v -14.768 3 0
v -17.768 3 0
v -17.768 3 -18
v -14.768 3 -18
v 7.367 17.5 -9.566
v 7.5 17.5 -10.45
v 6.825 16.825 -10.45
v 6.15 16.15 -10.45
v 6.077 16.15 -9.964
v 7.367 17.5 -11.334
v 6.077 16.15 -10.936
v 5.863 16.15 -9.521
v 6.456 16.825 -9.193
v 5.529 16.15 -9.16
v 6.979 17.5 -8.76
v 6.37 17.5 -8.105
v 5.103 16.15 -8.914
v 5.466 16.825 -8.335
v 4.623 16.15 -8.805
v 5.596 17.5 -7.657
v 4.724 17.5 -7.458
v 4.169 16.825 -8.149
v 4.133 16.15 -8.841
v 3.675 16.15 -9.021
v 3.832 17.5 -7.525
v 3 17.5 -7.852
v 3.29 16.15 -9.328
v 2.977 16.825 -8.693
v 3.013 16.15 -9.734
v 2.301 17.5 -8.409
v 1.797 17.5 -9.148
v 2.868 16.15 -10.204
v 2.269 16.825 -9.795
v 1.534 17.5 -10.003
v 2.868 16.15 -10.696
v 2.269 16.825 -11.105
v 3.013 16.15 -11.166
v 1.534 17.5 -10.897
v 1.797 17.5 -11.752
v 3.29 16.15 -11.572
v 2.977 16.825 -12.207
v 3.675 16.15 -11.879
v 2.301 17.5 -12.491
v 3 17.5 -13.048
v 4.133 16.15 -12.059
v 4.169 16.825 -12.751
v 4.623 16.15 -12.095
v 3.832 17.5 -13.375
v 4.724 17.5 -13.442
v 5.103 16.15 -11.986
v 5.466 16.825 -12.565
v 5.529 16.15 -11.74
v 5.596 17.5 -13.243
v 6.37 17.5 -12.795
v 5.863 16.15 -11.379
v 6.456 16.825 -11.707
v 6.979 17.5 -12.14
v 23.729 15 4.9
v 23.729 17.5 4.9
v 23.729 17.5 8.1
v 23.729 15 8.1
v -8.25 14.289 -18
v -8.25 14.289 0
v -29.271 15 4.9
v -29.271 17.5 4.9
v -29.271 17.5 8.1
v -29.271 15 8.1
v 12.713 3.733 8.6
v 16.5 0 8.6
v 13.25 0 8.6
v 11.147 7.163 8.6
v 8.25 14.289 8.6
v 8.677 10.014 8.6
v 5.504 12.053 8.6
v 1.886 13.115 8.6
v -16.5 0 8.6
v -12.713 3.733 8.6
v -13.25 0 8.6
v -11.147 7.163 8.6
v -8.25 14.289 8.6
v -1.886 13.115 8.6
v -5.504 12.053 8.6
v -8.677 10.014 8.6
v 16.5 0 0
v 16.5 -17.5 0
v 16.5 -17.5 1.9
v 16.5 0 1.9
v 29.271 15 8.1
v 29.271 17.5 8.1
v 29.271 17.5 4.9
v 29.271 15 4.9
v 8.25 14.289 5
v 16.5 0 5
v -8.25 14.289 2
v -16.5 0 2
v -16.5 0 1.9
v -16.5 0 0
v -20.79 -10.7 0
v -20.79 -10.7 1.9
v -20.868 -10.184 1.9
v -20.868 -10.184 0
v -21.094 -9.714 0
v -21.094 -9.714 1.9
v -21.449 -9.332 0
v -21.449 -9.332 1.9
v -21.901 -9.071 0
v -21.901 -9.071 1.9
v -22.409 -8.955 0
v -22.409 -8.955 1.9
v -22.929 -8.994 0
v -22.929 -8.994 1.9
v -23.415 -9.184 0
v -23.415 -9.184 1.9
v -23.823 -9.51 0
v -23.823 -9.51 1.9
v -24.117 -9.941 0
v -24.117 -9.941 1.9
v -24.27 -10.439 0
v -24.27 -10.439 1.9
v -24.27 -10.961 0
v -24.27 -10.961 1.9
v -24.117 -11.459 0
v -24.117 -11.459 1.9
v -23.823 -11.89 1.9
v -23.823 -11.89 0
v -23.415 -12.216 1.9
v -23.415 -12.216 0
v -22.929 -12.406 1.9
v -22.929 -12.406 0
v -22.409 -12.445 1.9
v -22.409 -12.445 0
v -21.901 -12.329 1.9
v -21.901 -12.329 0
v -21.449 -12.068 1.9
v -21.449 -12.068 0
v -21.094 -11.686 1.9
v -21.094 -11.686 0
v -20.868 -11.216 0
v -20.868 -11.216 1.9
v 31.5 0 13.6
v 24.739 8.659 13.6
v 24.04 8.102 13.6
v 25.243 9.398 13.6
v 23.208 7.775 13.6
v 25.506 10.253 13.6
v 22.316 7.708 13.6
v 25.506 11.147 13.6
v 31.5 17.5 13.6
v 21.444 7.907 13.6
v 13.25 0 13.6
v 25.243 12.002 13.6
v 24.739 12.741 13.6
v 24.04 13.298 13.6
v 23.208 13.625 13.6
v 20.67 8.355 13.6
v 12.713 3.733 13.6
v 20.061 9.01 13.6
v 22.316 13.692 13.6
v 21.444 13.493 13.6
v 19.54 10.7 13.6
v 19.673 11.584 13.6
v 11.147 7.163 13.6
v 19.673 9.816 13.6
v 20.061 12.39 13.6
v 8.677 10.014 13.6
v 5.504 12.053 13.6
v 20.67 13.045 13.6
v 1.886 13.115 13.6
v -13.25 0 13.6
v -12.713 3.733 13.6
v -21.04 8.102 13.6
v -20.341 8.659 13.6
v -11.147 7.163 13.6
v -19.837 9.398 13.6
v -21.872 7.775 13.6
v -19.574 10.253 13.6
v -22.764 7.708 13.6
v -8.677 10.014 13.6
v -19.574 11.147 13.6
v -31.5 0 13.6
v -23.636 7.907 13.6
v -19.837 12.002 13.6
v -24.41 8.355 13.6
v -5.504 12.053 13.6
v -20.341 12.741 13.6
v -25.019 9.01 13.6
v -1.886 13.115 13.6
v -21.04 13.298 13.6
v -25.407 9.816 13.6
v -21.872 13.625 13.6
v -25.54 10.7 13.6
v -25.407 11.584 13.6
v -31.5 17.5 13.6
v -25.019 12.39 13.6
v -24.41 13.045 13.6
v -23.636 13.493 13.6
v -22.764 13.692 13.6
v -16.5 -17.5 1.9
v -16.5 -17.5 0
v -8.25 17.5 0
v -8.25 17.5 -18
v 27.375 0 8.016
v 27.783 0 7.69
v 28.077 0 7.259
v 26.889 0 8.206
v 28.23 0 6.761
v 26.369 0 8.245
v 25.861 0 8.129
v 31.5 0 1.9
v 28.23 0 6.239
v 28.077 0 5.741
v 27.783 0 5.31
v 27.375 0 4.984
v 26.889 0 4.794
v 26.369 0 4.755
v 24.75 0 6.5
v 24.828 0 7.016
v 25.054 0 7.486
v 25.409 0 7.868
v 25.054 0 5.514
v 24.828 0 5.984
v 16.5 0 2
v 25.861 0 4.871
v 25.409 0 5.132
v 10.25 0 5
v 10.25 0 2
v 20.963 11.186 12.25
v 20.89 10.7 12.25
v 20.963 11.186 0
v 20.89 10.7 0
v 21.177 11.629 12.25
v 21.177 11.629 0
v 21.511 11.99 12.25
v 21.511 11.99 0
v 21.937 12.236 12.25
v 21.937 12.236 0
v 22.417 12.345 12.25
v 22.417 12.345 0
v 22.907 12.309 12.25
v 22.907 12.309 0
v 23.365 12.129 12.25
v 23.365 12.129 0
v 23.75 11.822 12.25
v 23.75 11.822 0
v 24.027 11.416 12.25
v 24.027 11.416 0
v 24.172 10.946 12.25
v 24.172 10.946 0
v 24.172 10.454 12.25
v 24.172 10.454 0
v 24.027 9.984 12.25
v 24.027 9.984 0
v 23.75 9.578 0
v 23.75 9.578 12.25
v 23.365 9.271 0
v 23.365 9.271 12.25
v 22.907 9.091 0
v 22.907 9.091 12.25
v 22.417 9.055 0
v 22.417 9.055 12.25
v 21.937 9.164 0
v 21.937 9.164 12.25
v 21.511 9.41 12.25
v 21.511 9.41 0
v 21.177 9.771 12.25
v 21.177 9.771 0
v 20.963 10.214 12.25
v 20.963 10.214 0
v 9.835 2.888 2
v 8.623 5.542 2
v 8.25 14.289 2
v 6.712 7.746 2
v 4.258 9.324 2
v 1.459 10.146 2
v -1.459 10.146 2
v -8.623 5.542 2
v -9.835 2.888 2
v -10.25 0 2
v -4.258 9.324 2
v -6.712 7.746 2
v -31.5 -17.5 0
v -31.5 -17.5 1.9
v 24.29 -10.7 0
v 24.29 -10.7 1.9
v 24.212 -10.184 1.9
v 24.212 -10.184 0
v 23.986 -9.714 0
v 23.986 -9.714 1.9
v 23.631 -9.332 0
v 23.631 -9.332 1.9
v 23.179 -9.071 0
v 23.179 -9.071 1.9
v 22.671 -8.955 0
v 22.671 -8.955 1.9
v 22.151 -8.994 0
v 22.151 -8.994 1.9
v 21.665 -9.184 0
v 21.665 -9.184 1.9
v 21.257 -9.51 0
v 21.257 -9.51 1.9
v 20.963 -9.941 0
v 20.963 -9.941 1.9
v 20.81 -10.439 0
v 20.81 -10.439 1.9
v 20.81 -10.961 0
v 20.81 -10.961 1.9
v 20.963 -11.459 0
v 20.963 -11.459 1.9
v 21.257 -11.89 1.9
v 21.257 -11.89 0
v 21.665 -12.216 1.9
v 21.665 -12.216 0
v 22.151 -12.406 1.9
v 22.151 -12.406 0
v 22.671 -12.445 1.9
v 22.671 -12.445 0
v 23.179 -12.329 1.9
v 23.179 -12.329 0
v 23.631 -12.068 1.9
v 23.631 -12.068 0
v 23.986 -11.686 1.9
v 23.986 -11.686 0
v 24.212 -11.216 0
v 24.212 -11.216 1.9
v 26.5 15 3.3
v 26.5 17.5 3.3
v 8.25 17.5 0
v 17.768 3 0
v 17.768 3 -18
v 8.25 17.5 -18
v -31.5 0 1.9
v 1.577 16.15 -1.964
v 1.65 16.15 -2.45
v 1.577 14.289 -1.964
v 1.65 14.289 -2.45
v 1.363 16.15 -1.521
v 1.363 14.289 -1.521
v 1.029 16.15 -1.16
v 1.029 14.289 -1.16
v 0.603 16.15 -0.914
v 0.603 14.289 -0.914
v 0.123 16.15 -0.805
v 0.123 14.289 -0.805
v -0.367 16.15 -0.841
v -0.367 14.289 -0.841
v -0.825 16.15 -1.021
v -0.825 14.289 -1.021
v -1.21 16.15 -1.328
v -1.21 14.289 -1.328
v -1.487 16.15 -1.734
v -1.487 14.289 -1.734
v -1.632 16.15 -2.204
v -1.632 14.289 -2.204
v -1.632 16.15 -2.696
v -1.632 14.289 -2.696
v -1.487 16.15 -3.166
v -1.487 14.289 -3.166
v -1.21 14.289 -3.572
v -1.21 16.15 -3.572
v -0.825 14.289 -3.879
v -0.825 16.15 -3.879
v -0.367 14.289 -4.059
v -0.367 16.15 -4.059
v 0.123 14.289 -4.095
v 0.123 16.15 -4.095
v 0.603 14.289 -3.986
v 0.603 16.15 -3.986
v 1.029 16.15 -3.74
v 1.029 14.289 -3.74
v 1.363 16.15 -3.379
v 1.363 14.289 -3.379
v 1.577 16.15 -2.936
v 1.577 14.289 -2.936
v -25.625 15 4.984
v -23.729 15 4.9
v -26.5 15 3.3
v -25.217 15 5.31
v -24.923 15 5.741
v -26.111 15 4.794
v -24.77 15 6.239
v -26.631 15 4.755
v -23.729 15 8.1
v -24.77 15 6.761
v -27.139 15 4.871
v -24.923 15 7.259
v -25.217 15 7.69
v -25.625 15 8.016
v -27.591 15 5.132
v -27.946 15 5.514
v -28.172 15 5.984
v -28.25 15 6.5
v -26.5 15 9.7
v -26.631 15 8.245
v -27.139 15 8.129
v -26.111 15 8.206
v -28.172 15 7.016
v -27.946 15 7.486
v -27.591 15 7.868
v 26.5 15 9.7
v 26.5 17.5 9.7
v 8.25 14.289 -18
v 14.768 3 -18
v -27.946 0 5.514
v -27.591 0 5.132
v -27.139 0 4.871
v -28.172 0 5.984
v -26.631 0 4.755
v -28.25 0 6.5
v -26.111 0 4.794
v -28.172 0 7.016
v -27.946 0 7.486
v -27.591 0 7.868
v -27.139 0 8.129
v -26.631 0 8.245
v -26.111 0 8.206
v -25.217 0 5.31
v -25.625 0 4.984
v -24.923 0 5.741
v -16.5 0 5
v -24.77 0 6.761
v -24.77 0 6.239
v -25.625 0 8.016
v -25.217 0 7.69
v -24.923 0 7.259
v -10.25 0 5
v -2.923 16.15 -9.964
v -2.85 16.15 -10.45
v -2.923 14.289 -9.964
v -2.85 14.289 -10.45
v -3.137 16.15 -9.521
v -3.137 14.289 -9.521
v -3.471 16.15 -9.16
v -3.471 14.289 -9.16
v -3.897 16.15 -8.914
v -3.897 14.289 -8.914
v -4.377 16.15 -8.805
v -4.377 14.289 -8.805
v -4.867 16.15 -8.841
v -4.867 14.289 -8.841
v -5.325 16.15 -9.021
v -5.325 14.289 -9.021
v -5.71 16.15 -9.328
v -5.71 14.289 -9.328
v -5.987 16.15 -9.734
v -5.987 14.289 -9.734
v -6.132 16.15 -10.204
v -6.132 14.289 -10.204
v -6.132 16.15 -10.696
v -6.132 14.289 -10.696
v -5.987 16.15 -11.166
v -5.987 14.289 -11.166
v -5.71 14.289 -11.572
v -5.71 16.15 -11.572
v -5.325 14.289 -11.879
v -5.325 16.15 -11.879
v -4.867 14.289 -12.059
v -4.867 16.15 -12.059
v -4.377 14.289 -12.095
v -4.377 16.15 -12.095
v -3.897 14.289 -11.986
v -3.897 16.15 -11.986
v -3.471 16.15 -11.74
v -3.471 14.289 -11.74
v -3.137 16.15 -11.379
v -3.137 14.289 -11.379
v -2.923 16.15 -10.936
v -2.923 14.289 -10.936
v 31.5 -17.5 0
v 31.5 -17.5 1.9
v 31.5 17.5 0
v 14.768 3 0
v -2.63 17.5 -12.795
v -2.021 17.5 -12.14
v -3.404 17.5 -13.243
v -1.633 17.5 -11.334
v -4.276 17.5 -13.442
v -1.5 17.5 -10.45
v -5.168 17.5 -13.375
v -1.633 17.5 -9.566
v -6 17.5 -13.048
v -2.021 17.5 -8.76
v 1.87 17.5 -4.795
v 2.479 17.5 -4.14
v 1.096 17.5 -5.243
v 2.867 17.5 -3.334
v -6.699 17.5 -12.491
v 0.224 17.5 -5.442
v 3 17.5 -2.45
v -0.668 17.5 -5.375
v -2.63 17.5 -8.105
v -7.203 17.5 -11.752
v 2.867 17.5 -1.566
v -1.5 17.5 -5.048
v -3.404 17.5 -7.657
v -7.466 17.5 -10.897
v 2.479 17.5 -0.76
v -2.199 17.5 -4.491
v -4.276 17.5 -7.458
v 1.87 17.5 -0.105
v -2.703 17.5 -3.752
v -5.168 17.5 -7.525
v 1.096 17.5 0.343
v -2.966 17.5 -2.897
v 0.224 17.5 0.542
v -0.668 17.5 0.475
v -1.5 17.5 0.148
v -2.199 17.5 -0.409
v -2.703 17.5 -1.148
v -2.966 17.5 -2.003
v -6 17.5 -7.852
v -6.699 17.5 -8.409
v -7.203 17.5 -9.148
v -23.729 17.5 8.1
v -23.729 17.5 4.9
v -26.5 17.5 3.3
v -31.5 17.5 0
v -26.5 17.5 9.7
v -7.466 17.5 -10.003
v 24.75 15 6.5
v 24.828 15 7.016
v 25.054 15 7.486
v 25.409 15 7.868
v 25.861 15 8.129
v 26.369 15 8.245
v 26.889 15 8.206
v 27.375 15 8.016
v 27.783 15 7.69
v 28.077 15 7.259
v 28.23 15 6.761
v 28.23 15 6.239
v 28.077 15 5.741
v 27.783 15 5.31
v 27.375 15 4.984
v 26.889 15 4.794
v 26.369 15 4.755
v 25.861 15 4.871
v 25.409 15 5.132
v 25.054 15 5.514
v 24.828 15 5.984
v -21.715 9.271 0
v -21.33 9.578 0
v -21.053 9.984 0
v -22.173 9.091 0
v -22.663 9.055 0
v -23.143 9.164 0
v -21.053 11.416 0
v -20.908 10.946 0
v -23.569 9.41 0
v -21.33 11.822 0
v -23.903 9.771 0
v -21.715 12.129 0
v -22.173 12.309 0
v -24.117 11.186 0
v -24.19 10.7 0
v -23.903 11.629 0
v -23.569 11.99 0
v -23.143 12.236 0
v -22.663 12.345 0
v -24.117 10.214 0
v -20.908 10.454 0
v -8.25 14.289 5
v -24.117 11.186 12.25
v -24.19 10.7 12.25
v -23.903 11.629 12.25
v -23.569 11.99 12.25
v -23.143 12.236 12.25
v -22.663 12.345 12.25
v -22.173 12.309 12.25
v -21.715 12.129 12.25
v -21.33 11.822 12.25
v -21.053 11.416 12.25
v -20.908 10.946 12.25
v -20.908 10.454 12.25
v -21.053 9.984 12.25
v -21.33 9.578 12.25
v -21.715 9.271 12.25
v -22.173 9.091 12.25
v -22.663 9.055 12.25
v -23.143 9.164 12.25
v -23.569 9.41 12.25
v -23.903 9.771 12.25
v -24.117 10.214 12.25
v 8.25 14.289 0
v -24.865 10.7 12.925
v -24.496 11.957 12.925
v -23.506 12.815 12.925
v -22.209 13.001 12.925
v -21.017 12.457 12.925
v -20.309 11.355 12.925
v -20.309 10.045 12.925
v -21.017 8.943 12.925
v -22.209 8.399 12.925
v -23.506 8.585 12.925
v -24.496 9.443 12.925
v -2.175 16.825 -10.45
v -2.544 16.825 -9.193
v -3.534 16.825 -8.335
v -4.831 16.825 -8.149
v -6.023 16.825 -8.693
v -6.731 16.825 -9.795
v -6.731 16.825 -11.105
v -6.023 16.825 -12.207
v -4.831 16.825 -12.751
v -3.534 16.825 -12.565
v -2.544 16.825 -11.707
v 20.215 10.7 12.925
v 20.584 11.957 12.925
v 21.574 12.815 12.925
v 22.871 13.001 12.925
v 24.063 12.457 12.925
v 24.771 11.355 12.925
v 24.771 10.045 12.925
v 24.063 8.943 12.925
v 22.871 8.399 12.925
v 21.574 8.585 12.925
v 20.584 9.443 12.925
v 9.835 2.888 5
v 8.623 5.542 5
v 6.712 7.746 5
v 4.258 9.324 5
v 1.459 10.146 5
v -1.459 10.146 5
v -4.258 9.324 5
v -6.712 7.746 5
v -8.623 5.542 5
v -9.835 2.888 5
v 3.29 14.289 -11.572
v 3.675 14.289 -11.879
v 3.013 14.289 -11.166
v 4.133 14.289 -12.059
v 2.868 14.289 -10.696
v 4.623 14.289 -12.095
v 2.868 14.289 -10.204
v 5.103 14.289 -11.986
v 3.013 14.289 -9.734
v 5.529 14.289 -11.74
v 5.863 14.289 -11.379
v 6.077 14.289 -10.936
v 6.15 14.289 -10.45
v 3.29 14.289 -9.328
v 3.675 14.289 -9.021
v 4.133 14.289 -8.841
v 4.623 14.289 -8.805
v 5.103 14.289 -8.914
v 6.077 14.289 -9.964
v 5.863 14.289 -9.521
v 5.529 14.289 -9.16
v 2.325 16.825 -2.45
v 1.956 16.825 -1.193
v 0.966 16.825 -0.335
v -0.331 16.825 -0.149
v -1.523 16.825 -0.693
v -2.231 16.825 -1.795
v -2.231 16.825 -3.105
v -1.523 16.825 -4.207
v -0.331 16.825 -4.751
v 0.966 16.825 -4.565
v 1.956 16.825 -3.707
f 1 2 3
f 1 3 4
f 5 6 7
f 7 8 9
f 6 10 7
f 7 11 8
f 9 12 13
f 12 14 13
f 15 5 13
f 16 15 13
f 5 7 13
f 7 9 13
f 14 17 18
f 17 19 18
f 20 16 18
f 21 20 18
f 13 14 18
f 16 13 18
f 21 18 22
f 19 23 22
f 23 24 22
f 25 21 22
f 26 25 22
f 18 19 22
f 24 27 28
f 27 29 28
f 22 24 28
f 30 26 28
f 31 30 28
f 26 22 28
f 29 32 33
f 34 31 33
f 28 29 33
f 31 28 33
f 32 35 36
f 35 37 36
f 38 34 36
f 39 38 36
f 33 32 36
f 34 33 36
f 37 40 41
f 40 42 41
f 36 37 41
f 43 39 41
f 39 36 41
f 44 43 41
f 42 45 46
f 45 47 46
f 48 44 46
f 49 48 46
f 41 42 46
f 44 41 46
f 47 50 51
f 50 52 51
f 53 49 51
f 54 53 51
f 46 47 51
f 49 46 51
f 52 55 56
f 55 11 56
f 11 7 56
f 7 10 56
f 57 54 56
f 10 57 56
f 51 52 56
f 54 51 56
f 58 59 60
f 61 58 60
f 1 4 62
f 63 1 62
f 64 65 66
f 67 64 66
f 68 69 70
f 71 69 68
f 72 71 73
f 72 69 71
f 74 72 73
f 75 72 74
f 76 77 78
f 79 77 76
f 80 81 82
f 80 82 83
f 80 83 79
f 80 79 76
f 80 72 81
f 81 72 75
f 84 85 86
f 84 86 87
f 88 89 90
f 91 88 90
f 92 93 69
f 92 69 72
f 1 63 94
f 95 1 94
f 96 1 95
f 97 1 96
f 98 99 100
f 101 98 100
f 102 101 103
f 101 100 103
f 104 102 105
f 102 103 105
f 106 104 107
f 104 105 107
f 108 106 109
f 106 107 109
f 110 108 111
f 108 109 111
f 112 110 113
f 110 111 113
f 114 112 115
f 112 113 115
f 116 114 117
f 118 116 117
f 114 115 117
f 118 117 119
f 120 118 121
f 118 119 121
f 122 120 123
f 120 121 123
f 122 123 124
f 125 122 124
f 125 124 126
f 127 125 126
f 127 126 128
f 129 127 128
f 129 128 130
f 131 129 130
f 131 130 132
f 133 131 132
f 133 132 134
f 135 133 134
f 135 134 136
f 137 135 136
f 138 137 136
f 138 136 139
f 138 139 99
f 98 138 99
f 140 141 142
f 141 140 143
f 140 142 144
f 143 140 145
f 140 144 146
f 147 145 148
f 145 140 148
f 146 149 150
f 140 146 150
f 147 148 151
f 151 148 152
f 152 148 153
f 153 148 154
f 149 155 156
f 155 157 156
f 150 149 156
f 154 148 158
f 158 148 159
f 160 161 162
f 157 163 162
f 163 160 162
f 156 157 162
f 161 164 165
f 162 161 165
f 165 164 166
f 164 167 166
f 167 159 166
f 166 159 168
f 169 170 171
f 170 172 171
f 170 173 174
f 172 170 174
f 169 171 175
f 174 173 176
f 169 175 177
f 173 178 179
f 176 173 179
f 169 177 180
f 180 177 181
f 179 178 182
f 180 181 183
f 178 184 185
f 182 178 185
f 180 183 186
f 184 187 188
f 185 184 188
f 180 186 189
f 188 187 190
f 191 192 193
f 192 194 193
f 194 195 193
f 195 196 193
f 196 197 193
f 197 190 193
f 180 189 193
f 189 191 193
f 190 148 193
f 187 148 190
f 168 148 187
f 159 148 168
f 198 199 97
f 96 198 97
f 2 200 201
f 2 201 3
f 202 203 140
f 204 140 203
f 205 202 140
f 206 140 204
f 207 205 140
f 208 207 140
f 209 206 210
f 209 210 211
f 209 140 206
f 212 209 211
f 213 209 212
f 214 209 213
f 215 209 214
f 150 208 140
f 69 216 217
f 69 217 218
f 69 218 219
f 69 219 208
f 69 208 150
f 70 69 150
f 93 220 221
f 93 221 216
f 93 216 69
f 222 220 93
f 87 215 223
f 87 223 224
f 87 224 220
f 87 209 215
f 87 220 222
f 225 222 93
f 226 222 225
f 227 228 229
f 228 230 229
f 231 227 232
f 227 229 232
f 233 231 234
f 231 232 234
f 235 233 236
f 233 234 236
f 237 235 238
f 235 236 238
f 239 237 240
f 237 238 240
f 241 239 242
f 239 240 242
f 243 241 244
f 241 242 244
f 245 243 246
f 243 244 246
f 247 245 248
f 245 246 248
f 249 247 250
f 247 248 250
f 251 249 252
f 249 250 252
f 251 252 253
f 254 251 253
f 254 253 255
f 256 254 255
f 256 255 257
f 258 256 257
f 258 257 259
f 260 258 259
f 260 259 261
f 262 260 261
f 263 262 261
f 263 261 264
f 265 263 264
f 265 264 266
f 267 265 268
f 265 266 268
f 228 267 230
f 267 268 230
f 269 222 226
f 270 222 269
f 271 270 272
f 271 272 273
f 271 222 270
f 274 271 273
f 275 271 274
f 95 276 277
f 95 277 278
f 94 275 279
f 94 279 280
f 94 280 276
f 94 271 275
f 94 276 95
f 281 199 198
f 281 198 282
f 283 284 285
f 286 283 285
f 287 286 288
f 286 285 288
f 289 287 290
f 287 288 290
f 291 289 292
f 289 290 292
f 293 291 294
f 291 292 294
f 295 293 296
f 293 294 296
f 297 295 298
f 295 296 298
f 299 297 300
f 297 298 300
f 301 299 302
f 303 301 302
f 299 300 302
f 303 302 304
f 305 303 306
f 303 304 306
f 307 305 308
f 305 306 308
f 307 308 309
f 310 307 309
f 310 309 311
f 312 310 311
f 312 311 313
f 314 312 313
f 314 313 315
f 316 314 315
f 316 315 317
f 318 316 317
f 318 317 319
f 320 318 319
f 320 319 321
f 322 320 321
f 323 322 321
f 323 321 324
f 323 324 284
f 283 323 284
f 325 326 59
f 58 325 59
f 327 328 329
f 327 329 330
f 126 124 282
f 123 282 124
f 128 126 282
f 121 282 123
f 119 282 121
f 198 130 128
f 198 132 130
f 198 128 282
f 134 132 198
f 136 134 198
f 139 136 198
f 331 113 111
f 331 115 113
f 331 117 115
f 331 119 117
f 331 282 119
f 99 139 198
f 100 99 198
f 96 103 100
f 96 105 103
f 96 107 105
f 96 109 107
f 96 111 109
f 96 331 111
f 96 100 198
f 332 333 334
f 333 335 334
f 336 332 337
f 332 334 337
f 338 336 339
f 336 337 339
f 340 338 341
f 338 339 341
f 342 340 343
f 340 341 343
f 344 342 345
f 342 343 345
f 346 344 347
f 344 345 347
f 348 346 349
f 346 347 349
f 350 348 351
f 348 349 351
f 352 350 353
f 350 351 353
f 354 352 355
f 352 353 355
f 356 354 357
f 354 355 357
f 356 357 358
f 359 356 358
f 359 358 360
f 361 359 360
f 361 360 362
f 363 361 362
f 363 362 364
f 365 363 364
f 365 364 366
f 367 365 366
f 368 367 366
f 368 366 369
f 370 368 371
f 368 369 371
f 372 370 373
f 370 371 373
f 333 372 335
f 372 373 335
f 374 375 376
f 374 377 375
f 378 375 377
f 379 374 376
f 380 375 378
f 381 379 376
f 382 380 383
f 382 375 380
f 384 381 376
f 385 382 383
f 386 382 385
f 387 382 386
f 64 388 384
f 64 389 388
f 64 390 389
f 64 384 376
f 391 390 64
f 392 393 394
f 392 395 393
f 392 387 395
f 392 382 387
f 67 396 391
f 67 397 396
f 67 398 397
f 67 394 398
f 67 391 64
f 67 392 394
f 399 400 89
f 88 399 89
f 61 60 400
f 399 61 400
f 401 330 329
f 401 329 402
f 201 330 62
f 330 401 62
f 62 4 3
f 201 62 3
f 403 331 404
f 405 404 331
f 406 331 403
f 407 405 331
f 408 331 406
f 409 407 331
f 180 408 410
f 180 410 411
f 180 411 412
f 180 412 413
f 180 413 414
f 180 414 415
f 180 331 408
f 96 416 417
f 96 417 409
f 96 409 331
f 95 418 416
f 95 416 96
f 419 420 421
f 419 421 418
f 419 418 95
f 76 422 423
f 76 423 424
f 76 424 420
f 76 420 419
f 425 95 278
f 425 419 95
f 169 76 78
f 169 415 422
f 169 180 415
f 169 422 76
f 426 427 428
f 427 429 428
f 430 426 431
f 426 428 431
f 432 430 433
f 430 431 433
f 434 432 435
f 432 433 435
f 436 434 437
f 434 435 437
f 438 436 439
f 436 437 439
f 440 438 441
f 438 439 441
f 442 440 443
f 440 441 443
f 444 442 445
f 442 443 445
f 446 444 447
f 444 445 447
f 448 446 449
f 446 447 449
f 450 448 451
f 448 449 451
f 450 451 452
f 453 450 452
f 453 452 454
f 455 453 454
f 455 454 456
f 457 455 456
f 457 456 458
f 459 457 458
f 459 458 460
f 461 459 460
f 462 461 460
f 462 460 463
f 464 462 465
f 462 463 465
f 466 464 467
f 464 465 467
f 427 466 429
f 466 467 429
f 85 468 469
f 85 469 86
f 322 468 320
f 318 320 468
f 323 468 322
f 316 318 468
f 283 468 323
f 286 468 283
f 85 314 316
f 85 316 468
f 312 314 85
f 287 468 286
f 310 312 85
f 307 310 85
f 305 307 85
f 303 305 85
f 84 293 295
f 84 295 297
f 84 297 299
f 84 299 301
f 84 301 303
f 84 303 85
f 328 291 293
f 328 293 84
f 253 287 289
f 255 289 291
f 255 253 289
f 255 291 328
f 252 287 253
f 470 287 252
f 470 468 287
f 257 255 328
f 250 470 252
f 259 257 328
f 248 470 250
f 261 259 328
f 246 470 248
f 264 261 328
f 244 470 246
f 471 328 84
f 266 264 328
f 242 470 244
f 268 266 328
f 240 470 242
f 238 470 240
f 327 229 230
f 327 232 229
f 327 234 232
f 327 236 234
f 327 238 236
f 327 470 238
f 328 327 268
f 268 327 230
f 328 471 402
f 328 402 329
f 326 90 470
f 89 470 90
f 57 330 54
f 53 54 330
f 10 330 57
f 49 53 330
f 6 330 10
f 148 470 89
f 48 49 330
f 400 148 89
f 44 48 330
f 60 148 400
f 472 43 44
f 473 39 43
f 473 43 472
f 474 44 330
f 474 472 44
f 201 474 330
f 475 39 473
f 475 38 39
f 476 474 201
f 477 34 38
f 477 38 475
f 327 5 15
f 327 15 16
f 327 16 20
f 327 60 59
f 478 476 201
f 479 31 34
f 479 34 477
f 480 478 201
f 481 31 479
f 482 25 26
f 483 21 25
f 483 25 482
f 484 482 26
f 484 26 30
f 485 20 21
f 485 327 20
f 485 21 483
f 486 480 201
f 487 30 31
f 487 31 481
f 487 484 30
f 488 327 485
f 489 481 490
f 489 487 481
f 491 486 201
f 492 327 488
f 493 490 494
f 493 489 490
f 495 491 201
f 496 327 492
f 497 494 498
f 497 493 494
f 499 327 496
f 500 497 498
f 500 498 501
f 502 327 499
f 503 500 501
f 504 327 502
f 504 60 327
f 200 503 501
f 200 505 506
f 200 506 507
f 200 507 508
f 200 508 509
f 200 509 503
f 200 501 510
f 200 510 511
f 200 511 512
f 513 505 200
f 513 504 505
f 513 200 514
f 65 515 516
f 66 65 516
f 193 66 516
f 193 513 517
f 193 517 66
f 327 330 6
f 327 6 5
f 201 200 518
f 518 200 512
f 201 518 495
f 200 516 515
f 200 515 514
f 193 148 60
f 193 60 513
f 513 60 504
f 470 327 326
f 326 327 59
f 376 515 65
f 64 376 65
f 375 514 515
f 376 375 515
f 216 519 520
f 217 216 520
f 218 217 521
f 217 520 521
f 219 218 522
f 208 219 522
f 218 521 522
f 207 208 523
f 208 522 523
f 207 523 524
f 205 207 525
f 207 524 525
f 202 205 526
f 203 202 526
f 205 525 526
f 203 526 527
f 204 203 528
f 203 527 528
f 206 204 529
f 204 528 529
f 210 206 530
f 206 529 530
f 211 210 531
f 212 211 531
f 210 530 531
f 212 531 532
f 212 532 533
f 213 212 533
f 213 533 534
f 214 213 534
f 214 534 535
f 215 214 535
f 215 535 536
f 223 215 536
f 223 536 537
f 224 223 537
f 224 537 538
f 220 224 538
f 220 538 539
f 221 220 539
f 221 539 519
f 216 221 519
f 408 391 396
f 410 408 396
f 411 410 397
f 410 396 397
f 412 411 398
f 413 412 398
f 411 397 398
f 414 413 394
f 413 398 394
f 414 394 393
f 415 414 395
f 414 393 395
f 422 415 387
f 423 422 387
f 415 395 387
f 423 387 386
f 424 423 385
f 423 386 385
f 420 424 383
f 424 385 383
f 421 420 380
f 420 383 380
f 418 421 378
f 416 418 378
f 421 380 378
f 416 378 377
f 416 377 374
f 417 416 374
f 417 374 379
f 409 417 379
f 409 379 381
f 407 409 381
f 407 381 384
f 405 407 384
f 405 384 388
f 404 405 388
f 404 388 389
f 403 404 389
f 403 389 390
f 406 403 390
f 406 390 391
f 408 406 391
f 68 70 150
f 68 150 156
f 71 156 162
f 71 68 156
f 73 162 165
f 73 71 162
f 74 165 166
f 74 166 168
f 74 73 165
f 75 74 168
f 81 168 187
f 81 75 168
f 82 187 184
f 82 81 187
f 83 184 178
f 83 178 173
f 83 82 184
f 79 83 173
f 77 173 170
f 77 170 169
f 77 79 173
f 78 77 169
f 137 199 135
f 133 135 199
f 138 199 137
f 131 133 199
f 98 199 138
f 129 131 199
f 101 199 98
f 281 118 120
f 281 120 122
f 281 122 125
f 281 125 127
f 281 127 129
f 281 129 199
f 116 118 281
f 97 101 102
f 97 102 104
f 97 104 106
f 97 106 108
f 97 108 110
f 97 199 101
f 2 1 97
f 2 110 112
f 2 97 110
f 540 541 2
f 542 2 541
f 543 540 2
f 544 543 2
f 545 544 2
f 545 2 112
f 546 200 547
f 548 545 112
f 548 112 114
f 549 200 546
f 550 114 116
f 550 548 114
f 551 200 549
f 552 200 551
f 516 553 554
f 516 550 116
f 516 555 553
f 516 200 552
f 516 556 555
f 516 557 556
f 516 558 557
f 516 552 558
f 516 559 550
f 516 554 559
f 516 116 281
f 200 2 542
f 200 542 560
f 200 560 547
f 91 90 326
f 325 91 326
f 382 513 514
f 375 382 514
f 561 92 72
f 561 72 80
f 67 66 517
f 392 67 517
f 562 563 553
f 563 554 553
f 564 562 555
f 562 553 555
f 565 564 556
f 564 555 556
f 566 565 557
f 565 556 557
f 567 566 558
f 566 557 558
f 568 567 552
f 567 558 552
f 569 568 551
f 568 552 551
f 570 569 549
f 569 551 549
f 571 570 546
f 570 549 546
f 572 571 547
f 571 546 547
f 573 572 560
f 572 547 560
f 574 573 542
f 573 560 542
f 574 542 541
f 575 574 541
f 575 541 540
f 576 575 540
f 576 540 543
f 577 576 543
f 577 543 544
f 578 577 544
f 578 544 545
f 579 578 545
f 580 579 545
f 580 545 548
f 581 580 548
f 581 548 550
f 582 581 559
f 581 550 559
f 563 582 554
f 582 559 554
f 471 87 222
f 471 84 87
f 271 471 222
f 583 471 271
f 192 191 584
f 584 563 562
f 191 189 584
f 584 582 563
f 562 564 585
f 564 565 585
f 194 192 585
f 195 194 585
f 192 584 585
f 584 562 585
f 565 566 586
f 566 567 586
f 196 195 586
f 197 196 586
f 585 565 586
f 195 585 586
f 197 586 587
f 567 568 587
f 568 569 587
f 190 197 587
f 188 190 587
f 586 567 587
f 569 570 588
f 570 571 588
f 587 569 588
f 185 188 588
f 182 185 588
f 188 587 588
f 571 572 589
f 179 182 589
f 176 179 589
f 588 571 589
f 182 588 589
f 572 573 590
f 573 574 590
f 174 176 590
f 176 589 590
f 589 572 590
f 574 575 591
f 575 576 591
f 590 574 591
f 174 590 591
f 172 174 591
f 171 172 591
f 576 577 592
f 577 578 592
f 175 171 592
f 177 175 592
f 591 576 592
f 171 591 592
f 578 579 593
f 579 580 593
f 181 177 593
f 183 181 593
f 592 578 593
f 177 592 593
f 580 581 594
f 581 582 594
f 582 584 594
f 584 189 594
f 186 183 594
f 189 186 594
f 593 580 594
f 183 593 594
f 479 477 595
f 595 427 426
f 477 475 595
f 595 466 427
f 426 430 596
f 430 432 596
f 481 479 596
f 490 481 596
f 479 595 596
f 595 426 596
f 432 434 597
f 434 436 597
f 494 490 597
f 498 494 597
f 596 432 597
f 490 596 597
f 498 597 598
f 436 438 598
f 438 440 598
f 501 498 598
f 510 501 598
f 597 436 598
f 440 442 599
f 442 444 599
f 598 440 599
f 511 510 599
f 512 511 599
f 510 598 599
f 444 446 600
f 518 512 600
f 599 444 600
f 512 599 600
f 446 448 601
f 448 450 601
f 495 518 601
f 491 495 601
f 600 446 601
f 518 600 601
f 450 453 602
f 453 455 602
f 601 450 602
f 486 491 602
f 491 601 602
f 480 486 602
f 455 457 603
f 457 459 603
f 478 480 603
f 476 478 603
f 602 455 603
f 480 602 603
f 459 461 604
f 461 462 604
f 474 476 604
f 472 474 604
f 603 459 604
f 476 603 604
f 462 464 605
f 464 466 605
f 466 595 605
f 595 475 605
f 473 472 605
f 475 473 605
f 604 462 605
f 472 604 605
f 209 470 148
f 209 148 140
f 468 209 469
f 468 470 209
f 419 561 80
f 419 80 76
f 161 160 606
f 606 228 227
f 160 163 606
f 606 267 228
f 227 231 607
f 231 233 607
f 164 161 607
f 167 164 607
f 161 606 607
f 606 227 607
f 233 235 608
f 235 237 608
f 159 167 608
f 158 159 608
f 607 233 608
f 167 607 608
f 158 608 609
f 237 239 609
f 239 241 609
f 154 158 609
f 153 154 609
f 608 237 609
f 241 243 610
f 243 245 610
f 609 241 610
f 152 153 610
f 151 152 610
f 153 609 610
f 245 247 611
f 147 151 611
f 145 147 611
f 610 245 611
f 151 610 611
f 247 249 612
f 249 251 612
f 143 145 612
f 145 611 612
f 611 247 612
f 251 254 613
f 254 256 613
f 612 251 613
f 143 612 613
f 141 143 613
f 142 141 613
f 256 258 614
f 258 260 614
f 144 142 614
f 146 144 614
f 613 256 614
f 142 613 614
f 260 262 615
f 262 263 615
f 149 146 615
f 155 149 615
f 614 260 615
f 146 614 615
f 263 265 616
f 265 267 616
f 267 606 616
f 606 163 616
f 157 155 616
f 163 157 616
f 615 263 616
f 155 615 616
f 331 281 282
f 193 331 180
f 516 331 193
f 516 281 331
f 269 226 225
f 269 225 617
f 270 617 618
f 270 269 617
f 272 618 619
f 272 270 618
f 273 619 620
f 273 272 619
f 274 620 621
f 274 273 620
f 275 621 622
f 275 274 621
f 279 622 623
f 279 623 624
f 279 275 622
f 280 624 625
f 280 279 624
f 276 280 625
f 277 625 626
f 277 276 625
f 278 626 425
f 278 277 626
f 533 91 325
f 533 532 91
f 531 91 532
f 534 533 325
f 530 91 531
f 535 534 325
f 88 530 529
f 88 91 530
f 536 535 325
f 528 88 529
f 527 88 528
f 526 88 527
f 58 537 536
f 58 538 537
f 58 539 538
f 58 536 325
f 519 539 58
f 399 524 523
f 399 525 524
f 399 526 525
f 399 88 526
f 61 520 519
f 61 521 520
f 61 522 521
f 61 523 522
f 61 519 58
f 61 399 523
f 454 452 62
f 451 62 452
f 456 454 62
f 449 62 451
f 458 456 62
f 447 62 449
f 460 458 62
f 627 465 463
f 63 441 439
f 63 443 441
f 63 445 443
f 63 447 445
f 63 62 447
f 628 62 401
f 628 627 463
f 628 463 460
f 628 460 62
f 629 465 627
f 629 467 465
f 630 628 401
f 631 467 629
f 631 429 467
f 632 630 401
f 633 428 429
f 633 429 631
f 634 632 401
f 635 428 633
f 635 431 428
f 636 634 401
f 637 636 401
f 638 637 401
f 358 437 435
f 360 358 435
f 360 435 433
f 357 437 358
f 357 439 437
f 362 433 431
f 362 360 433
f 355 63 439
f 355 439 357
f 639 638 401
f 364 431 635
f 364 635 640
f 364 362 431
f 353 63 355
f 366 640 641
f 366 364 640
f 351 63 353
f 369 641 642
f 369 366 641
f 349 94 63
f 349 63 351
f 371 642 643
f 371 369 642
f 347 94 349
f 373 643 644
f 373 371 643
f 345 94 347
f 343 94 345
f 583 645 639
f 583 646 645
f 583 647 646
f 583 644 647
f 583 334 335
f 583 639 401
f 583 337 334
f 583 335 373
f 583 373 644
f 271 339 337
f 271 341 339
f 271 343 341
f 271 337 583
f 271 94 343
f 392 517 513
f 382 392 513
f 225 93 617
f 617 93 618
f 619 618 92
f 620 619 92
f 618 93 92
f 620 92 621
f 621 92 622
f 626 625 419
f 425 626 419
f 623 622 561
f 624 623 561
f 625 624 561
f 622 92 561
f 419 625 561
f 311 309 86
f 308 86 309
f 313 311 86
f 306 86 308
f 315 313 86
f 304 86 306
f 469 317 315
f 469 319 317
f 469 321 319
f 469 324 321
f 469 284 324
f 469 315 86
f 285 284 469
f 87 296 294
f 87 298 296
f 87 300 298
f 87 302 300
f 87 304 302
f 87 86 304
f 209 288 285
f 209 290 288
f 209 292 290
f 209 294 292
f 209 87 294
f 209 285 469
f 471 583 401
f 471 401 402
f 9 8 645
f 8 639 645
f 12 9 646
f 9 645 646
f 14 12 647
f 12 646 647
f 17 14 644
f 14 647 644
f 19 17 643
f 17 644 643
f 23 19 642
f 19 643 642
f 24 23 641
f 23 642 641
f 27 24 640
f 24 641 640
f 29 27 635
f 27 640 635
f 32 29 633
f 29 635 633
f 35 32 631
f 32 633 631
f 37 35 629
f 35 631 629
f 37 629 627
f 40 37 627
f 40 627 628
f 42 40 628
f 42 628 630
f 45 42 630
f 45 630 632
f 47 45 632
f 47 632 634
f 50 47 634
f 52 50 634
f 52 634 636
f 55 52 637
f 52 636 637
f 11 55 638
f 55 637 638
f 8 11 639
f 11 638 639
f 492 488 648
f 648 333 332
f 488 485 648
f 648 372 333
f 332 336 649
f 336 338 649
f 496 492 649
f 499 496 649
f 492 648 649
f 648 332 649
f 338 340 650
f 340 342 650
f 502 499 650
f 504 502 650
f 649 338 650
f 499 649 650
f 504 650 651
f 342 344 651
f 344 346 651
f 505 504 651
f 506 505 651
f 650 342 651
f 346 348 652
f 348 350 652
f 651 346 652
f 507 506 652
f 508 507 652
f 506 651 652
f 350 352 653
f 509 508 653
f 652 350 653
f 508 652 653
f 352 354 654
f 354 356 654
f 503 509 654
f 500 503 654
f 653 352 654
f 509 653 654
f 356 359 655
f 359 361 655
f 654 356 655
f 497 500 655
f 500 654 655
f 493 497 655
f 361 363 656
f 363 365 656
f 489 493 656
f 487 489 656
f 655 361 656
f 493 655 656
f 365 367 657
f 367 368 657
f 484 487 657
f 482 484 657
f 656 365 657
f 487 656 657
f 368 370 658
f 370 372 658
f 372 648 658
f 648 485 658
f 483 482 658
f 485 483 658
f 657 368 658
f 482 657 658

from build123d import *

# Parameters (mm, degrees)
PAD_DEPTH           = 2
PAD001_DEPTH        = 3
PAD002_DEPTH        = 3.6
PAD003_DEPTH        = 5
SKETCH004_W         = 63
SKETCH004_H         = 17.5
POCKET_DEPTH        = 11.7
PAD004_DEPTH        = 18
HOLE_D              = 3.3
HOLE_DEPTH          = 24.00858
HOLE_CSINK_D        = 6
HOLE_CSINK_ANGLE    = 90
HOLE_TIPS_R         = 1.65
SKETCH010_R         = 1.75
POCKET001_DEPTH     = 5
HOLE001_D           = 3.3
HOLE001_DEPTH       = 24.00858
HOLE001_CSINK_D     = 6
HOLE001_CSINK_ANGLE = 90
HOLE001_TIPS_R      = 1.65
SKETCH012_R         = 1.75
POCKET002_DEPTH     = 5
SKETCH013_R         = 1.75
POCKET003_DEPTH     = 35.001
POCKET004_DEPTH     = 2.5


with BuildPart() as part:
    # Sketch → Pad (new body)
    with BuildSketch(Plane.XY):
        Polygon((-31.5, 17.5), (31.5, 17.5), (31.5, -17.5), (16.5, -17.5), (16.5, -3e-05), (8.25, 14.289419), (-8.25, 14.289419), (-16.5, 0), (-16.5, -17.5), (-31.5, -17.5), align=None)
    extrude(amount=PAD_DEPTH)

    # Sketch001 (on Face12 of Pad) → Pad001 (join)
    with BuildSketch(Plane.XY.offset(2)):
        with BuildLine():
            ThreePointArc((10.25, -3e-05), (1.5e-05, 10.25), (-10.25, 0))
            Line((-16.5, 0), (-10.25, 0))
            Line((-16.5, -17.5), (-16.5, 0))
            Line((-16.5, -17.5), (-31.5, -17.5))
            Line((-31.5, -17.5), (-31.5, 17.5))
            Line((-31.5, 17.5), (31.5, 17.5))
            Line((31.5, 17.5), (31.5, -17.5))
            Line((31.5, -17.5), (16.5, -17.5))
            Line((16.5, -17.5), (16.5, -3e-05))
            Line((10.25, -3e-05), (16.5, -3e-05))
        make_face()
    extrude(amount=PAD001_DEPTH)

    # Sketch002 (on Face20 of Pad001) → Pad002 (join)
    with BuildSketch(Plane.XY.offset(5)):
        Polygon((16.5, 0), (8.25, 14.289419), (-8.25, 14.289419), (-16.5, 0), (-16.5, -17.5), (-31.5, -17.5), (-31.5, 17.5), (31.5, 17.5), (31.5, -17.5), (16.5, -17.5), align=None)
    extrude(amount=PAD002_DEPTH)

    # Sketch003 (on Face30 of Pad002) → Pad003 (join)
    with BuildSketch(Plane.XY.offset(8.6)):
        with BuildLine():
            Line((-31.5, 17.5), (31.5, 17.5))
            Line((31.5, 17.5), (31.5, -17.5))
            Line((31.5, -17.5), (16.5, -17.5))
            Line((16.5, -17.5), (16.5, 0))
            Line((16.5, 0), (13.25, 0))
            ThreePointArc((13.25, 0), (0, 13.25), (-13.25, 0))
            Line((-16.5, 0), (-13.25, 0))
            Line((-16.5, -17.5), (-16.5, 0))
            Line((-16.5, -17.5), (-31.5, -17.5))
            Line((-31.5, -17.5), (-31.5, 17.5))
        make_face()
    extrude(amount=PAD003_DEPTH)

    # Sketch004 (on Face40 of Pad003) → Pocket (cut)
    with BuildSketch(Plane.XY.offset(13.6)):
        with Locations((0, -8.75)):
            Rectangle(SKETCH004_W, SKETCH004_H)
    extrude(amount=-POCKET_DEPTH, mode=Mode.SUBTRACT)

    # Sketch008 (on Face1 of Pocket) → Pad004 (join)
    with BuildSketch(Plane(origin=(0, 0, 0), x_dir=(1, 0, 0), z_dir=(0, 0, -1))):
        Polygon((-8.25, -14.289419), (8.25, -14.289419), (14.767953, -2.99997), (17.767953, -3), (8.25, -17.5), (-8.25, -17.5), (-17.767949, -3), (-14.767949, -3), align=None)
    extrude(amount=PAD004_DEPTH)

    # Hole
    with Locations(Plane(origin=(0, 17.5, 0), x_dir=(-1, 0, 0), z_dir=(0, 1, 0))):
        with Locations((0, -2.45), (-4.5, -10.45), (4.5, -10.45)):
            CounterSinkHole(HOLE_D / 2, HOLE_CSINK_D / 2, depth=HOLE_DEPTH, counter_sink_angle=HOLE_CSINK_ANGLE)

    # Hole tips → Hole tip 1 section 0
    with BuildSketch(Plane(origin=(0, -6.50858, 0), x_dir=(-1, 0, 0), z_dir=(0, 1, 0)), mode=Mode.PRIVATE) as hole_tip_1_s0:
        with Locations((0, -2.45)):
            Circle(HOLE_TIPS_R)
    loft([hole_tip_1_s0.sketch, Vertex(0, -7.5, -2.45)], mode=Mode.SUBTRACT)

    # Hole tips → Hole tip 2 section 0
    with BuildSketch(Plane(origin=(0, -6.50858, 0), x_dir=(-1, 0, 0), z_dir=(0, 1, 0)), mode=Mode.PRIVATE) as hole_tip_2_s0:
        with Locations((-4.5, -10.45)):
            Circle(HOLE_TIPS_R)
    loft([hole_tip_2_s0.sketch, Vertex(4.5, -7.5, -10.45)], mode=Mode.SUBTRACT)

    # Hole tips → Hole tip 3 section 0
    with BuildSketch(Plane(origin=(0, -6.50858, 0), x_dir=(-1, 0, 0), z_dir=(0, 1, 0)), mode=Mode.PRIVATE) as hole_tip_3_s0:
        with Locations((4.5, -10.45)):
            Circle(HOLE_TIPS_R)
    loft([hole_tip_3_s0.sketch, Vertex(-4.5, -7.5, -10.45)], mode=Mode.SUBTRACT)

    # Sketch010 → Pocket001 (cut)
    with BuildSketch(Plane.XY.offset(1.9)):
        with Locations((-22.54, 24.3)):
            Circle(SKETCH010_R)
        with Locations((7.79, 24.3)):
            Circle(SKETCH010_R)
    extrude(amount=-POCKET001_DEPTH, mode=Mode.SUBTRACT)

    # Hole001
    with Locations(Plane.XY.offset(13.6)):
        with Locations((-22.54, 10.7), (22.54, 10.7)):
            CounterSinkHole(HOLE001_D / 2, HOLE001_CSINK_D / 2, depth=HOLE001_DEPTH, counter_sink_angle=HOLE001_CSINK_ANGLE)

    # Hole001 tips → Hole001 tip 1 section 0
    with BuildSketch(Plane.XY.offset(-10.40858), mode=Mode.PRIVATE) as hole001_tip_1_s0:
        with Locations((-22.54, 10.7)):
            Circle(HOLE001_TIPS_R)
    loft([hole001_tip_1_s0.sketch, Vertex(-22.54, 10.7, -11.4)], mode=Mode.SUBTRACT)

    # Hole001 tips → Hole001 tip 2 section 0
    with BuildSketch(Plane.XY.offset(-10.40858), mode=Mode.PRIVATE) as hole001_tip_2_s0:
        with Locations((22.54, 10.7)):
            Circle(HOLE001_TIPS_R)
    loft([hole001_tip_2_s0.sketch, Vertex(22.54, 10.7, -11.4)], mode=Mode.SUBTRACT)

    # Sketch012 (on Face6 of Hole001) → Pocket002 (cut)
    with BuildSketch(Plane.XY.offset(1.9)):
        with Locations((-22.54, -10.7)):
            Circle(SKETCH012_R)
        with Locations((22.54, -10.7)):
            Circle(SKETCH012_R)
    extrude(amount=-POCKET002_DEPTH, mode=Mode.SUBTRACT)

    # Sketch013 (on Face43 of Pocket002) → Pocket003 (cut, through all)
    with BuildSketch(Plane(origin=(0, 17.5, 0), x_dir=(-1, 0, 0), z_dir=(0, 1, 0))):
        with Locations((-26.5, 6.5)):
            Circle(SKETCH013_R)
        with Locations((26.5, 6.5)):
            Circle(SKETCH013_R)
    extrude(amount=-POCKET003_DEPTH, mode=Mode.SUBTRACT)

    # Sketch014 (on Face44 of Pocket003) → Pocket004 (cut)
    with BuildSketch(Plane(origin=(0, 17.5, 0), x_dir=(-1, 0, 0), z_dir=(0, 1, 0))):
        Polygon((-26.5, 3.3), (-23.728719, 4.9), (-23.728719, 8.1), (-26.5, 9.7), (-29.271281, 8.1), (-29.271281, 4.9), align=None)
        Polygon((29.271281, 4.9), (29.271281, 8.1), (26.5, 9.7), (23.728719, 8.1), (23.728719, 4.9), (26.5, 3.3), align=None)
    extrude(amount=-POCKET004_DEPTH, mode=Mode.SUBTRACT)


solid = part.part
